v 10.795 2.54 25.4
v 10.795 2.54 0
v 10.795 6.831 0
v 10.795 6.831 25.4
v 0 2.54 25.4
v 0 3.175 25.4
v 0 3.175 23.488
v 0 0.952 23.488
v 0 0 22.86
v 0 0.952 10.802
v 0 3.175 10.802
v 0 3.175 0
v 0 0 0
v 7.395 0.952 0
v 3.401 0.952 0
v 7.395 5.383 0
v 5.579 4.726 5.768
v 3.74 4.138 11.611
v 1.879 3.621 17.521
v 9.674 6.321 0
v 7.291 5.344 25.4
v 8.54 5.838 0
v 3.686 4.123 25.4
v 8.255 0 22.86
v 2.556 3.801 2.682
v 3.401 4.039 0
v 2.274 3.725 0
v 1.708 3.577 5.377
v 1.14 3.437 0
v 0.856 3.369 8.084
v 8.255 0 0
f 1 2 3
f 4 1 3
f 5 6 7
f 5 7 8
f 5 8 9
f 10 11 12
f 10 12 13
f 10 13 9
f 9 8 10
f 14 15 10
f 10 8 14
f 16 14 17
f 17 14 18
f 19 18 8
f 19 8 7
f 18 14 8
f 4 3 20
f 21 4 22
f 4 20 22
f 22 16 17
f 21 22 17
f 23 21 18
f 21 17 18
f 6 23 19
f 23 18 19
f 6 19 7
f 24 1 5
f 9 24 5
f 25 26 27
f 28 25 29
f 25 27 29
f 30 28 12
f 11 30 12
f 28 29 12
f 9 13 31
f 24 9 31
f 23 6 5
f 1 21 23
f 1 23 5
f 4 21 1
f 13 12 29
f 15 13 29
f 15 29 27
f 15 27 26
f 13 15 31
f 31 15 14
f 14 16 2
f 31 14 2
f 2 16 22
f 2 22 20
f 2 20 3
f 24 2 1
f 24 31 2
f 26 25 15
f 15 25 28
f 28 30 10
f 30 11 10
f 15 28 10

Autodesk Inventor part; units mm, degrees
ref_plane "YZ Plane" through (0, 0, 0) normal (1, 0, 0) x (0, 1, 0)
sketch "Sketch1" plane through (0, 0, 0) normal (0, 0, 1) x (1, 0, 0)
  line L0 (0, 3.175) -> (0, 0)
  line L1 (0, 0) -> (10.795, 0)
  line L2 (10.795, 0) -> (10.795, 6.831)
  arc A0 (0, 3.175) -> (10.795, 6.831) centre (-10.795, 52.8148) ccw
  line L3 (0, 3.175) -> (-10.795, 3.175) construction
  line L4 (-10.795, 3.175) -> (-10.795, 2.0148) construction
  arc A1 (-10.795, 2.0148) -> (0, 3.175) centre (-10.795, 52.8148) ccw construction
  dimension "d0" = 50.8
  dimension "d1" = 3.175
  dimension "d4" = 10.795
  dimension "d11" = 10.795
extrude "Extrusion1" add sketch "Sketch1" along normal blind 25.4
ref_plane "Work Plane1" through (0, 3.175, 0) normal (0, -1, 0) x (1, 0, 0)
sketch "Sketch2" plane through (0, 3.175, 0) normal (0, -1, 0) x (1, 0, 0)
  line L0 (0, 0) -> (0, 25.4) projected
  line L1 (0, 17.145) -> (5.3975, 0)
  line L2 (10.795, 0) -> (0, 0) projected
  line L3 (0, 25.4) -> (10.795, 25.4) projected
  dimension "d6" = 8.255
ref_plane "Work Plane2" through (0, 3.175, 17.145) normal (0.3003, 0, -0.9538) x (0, 1, 0)
sketch "Sketch3" plane through (0, 3.175, 17.145) normal (0.3003, 0, -0.9538) x (0, 1, 0)
  line L0 (2.2225, -1.905) -> (-2.2225, -1.905)
  line L1 (-2.2225, -1.905) -> (-2.2225, 1.905)
  line L2 (-2.2225, 1.905) -> (2.2225, 1.905)
  line L3 (2.2225, 1.905) -> (2.2225, -1.905)
  point P0 (-3.175, -5.1484)
  point P1 (0, 0)
  point P2 (2.2225, 0)
  point P3 (0, 1.905)
  dimension "d7" = 4.445
  dimension "d10" = 3.81
extrude "Extrusion2" cut sketch "Sketch3" along normal through all both and the other way through all
chamfer "Chamfer1" distance 2.54 angle 45 1 edges at (10.795, 0, 12.7)
chamfer "Chamfer2" distance 2.54 angle 45 1 edges at (4.1275, 0, 25.4)
properties part number "WireGuideToSail1" material "ABS Plastic"
